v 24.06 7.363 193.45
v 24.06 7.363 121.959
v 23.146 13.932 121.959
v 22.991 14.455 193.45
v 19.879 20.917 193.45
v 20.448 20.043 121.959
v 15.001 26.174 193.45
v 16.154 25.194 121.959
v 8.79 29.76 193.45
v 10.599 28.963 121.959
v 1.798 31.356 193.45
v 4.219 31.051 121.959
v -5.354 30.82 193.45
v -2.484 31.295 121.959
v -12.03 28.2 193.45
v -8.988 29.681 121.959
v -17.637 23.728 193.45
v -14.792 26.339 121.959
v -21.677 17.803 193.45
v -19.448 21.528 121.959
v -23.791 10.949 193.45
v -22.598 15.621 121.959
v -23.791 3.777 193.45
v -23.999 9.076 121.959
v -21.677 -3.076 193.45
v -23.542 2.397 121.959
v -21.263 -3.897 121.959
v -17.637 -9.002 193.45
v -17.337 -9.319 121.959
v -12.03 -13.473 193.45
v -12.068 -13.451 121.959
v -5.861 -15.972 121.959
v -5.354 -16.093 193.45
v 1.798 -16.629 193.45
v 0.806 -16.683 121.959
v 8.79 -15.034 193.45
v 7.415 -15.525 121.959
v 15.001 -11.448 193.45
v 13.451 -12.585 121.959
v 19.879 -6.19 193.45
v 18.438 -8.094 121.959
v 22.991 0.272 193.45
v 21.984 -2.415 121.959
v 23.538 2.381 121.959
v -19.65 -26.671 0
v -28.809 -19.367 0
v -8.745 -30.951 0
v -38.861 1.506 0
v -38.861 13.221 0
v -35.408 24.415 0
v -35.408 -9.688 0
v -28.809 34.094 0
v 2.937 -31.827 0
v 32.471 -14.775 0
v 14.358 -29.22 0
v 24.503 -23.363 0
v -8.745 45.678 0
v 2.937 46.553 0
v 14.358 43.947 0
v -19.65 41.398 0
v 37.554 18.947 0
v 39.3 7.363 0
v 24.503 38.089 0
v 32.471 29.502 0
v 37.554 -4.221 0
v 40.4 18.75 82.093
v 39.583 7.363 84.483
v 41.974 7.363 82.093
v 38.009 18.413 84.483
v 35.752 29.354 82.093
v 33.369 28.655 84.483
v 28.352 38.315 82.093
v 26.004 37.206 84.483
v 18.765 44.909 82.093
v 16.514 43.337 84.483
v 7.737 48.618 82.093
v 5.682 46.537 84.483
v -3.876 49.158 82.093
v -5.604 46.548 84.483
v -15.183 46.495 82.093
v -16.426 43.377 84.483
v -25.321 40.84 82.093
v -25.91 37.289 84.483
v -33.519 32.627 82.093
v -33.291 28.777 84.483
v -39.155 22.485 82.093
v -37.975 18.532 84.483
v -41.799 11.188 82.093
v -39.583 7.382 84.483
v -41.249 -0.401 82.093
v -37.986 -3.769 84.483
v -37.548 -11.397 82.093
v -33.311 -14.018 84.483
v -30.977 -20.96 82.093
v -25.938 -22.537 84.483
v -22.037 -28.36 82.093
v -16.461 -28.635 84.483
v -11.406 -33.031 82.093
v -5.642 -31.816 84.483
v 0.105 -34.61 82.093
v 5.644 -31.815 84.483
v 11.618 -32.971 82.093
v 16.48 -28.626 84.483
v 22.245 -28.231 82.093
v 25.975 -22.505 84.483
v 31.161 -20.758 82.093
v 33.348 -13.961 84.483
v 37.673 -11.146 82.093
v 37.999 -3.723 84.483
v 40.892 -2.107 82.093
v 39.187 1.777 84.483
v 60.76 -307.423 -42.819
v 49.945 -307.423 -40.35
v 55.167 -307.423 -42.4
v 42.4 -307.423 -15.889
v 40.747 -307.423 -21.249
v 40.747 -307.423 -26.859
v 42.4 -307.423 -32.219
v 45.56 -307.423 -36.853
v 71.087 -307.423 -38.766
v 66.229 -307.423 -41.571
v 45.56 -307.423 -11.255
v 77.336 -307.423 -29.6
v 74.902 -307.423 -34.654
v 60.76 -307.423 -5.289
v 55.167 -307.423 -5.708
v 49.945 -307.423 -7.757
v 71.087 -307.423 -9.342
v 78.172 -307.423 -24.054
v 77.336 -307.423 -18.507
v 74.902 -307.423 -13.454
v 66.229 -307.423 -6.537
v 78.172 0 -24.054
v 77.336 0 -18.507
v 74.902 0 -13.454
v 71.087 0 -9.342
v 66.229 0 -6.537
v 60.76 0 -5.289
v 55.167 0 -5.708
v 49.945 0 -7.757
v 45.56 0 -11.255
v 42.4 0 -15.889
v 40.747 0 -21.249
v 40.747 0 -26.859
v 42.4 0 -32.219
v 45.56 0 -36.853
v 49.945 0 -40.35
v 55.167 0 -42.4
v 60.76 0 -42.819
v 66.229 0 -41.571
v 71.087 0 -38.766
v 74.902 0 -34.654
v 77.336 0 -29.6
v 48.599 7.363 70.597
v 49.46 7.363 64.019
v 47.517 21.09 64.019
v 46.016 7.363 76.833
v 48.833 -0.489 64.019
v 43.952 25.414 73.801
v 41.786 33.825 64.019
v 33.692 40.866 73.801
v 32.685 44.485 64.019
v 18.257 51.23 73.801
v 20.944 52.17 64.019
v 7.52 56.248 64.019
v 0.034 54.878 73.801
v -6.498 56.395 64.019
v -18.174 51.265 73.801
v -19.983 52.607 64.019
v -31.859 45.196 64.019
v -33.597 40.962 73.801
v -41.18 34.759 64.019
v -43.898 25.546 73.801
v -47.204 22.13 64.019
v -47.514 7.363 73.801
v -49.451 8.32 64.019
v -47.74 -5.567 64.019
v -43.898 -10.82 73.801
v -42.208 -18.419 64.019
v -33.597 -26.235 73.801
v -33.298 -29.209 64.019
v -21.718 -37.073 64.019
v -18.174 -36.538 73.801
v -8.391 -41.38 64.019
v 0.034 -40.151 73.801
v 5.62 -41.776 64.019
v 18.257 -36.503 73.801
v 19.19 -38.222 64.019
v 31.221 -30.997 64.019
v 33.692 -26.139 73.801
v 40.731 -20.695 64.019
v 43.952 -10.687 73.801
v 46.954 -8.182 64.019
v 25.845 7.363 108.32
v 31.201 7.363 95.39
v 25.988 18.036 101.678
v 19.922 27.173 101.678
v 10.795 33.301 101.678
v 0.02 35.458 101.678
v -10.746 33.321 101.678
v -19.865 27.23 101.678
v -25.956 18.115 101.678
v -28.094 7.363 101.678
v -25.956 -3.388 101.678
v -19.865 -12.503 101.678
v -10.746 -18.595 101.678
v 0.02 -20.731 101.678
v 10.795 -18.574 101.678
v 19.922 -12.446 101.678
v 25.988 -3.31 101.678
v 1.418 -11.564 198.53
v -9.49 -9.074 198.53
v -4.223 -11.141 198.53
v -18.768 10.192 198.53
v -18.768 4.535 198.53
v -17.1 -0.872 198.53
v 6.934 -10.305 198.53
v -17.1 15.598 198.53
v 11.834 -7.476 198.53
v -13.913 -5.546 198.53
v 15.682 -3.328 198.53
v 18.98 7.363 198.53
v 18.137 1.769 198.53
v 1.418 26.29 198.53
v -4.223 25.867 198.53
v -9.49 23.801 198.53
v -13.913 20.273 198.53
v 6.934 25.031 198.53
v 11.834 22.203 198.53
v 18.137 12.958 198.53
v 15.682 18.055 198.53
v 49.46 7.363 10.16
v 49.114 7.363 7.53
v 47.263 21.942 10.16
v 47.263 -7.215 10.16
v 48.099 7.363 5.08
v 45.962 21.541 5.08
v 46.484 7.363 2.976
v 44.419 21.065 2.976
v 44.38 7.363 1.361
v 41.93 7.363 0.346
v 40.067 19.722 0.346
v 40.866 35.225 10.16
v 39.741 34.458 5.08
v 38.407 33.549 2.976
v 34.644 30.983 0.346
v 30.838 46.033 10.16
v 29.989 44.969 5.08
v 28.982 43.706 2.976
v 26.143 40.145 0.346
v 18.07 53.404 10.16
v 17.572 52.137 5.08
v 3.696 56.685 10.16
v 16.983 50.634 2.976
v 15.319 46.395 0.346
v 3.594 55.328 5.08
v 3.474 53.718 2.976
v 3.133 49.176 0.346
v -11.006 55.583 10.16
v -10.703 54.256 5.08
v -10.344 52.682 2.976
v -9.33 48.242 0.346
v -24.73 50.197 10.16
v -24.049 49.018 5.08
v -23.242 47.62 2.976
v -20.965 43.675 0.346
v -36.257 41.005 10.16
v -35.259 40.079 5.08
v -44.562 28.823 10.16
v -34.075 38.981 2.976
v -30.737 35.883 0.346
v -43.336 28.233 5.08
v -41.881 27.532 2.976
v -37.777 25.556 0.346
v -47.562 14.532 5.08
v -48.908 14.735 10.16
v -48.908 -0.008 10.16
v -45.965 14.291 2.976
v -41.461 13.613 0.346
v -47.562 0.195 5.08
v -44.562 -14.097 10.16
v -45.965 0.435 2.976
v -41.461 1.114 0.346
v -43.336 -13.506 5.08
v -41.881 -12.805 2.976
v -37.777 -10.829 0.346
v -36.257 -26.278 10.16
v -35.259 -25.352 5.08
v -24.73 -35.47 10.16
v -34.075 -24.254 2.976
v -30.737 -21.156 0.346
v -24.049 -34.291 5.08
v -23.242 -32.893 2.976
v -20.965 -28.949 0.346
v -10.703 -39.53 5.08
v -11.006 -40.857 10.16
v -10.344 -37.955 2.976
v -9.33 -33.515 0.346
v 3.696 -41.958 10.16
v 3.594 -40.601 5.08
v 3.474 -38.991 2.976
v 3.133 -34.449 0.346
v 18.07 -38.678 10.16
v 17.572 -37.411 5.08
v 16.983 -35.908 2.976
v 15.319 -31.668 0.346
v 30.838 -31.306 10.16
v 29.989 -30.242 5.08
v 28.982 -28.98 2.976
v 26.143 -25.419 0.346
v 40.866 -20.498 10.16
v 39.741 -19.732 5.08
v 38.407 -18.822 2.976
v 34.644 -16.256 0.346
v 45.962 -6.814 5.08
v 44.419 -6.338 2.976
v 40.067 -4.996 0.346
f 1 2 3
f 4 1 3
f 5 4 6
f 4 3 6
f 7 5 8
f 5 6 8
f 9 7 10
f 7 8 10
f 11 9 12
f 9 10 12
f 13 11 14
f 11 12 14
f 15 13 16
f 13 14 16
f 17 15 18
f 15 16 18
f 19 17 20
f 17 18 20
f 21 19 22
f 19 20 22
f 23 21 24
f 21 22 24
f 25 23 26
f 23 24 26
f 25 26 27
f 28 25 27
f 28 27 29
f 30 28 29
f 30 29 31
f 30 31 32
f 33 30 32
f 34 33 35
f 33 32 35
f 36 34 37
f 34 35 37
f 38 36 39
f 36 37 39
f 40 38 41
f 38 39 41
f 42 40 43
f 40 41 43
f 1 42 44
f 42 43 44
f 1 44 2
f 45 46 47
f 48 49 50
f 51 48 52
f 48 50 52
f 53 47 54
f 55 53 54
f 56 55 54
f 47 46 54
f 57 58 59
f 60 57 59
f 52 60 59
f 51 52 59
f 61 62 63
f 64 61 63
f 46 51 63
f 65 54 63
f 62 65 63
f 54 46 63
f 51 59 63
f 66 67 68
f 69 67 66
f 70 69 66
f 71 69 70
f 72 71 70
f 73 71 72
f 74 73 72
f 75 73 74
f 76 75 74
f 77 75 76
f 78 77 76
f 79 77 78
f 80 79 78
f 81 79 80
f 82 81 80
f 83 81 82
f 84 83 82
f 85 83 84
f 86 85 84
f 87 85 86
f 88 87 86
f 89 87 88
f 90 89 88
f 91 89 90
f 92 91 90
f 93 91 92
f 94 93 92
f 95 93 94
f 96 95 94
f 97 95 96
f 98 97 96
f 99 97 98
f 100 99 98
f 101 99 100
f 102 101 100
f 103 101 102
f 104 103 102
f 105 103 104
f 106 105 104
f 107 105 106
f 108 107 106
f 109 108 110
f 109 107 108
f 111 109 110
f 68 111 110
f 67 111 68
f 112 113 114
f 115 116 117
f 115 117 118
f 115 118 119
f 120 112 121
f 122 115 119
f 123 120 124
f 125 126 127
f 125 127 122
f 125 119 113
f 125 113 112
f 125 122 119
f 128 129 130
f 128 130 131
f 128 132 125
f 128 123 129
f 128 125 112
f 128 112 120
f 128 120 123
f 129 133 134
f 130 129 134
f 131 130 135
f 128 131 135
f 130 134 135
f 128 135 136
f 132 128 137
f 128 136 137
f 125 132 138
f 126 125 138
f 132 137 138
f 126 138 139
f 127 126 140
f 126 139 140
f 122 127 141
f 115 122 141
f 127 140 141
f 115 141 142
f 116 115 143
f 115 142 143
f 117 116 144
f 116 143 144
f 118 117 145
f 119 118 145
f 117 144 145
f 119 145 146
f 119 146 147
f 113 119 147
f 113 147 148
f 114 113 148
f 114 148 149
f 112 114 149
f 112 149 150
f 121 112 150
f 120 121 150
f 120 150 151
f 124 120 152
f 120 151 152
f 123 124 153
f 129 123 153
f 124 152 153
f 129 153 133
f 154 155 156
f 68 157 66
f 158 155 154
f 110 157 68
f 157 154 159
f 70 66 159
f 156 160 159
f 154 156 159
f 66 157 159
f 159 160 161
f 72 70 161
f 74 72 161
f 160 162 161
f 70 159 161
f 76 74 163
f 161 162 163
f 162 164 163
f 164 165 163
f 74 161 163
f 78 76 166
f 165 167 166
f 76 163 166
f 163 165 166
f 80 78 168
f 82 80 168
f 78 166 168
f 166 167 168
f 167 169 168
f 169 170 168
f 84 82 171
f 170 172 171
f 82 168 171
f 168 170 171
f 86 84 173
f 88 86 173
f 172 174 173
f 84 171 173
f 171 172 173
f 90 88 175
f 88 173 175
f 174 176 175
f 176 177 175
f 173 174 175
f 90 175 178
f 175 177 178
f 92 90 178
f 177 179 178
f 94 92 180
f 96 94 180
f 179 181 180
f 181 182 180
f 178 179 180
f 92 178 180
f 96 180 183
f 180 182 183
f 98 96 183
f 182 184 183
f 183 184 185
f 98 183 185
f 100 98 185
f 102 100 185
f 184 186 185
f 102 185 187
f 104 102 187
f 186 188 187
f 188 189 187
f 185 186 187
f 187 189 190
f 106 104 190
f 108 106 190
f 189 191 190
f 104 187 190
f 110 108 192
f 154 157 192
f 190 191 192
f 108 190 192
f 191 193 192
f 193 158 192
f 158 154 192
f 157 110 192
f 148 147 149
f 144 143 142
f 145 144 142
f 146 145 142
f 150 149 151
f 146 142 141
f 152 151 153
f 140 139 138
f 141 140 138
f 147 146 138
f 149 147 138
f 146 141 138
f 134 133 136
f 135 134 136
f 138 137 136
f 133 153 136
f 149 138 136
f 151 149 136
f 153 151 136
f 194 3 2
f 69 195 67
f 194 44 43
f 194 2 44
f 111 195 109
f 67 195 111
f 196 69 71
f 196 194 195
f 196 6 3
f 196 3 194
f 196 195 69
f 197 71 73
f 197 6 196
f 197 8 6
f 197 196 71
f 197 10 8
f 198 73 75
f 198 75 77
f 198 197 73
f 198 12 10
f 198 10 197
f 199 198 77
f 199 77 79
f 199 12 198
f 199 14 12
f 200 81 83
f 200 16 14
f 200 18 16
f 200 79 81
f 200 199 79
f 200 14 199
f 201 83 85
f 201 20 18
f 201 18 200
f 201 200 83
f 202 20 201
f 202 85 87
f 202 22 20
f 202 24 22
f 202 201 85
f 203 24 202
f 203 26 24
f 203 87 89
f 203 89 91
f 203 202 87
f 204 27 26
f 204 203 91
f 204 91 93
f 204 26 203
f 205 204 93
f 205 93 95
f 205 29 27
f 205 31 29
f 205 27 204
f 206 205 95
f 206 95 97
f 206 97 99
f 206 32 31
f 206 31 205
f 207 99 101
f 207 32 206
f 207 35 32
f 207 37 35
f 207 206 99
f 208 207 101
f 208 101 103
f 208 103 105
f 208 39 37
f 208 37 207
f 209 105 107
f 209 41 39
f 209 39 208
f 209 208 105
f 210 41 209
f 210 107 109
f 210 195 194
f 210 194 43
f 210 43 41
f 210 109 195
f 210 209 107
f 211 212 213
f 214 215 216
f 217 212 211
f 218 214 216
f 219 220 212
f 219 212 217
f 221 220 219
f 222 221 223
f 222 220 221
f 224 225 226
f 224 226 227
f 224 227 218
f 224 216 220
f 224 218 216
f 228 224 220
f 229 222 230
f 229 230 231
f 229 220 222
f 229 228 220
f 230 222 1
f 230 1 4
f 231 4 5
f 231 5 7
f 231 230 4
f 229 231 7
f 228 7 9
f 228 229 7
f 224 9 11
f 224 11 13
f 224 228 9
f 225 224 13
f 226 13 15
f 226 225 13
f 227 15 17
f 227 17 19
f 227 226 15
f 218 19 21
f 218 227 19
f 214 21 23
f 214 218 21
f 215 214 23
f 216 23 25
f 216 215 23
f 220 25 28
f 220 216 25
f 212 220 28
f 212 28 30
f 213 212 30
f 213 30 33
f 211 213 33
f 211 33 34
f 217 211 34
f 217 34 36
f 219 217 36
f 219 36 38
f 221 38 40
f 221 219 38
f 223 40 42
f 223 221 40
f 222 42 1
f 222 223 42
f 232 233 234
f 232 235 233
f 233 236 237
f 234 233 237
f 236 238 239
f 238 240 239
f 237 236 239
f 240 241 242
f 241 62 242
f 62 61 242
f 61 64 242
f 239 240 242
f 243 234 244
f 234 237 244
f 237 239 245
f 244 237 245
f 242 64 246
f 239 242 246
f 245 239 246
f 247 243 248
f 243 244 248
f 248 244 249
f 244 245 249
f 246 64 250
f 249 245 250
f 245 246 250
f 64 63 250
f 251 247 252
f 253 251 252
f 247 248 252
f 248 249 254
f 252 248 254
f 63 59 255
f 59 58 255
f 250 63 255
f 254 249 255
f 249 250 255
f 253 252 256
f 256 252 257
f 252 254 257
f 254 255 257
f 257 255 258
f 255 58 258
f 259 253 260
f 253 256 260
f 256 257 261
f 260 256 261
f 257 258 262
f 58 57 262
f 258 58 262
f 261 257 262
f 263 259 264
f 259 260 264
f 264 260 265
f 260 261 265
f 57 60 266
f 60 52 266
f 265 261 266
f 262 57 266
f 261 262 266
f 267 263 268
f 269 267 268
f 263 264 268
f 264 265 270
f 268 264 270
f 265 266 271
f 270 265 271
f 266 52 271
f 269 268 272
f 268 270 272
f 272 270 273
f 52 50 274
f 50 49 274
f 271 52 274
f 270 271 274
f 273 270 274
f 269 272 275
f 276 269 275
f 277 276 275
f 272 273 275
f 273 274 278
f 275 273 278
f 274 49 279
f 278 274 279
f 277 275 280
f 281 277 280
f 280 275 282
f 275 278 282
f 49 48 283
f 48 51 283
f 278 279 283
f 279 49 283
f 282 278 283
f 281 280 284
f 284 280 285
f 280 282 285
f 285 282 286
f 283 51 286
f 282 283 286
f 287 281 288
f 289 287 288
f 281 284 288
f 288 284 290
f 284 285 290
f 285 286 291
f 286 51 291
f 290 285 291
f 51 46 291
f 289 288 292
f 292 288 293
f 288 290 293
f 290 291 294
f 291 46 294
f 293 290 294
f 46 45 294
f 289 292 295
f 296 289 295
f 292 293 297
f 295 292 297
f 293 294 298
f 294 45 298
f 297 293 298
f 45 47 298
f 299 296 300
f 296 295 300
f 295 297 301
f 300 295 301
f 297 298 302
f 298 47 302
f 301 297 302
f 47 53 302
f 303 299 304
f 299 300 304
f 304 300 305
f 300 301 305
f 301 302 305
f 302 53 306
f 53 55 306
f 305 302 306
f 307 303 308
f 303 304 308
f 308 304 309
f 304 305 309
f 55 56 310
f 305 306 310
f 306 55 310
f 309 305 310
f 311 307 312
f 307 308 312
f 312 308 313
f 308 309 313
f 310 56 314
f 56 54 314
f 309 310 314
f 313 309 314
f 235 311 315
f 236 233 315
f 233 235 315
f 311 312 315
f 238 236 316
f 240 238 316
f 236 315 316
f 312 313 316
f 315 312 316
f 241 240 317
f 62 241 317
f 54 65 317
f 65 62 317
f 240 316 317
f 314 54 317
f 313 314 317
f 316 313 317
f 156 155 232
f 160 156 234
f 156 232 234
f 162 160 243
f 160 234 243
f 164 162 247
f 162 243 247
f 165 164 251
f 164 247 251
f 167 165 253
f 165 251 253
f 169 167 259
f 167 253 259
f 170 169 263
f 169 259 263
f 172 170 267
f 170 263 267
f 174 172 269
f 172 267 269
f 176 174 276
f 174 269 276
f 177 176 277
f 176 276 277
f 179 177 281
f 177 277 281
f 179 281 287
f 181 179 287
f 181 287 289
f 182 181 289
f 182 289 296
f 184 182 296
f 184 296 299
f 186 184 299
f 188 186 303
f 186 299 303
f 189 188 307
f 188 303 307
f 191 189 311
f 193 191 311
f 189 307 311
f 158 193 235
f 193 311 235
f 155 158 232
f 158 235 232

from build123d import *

# Parameters (mm, degrees)
F0_R     = 49.4600164877
F1_DEPTH = 100.0064834952
F2_SIZE  = 25.4
F3_R     = 25.559552511
F4_DEPTH = 98.5232293606
F5_R     = 52.9991248182
F6_SIZE  = 5.08
F7_R     = 10.16
F8_R     = 18.8176208756
F9_DEPTH = 307.4226379395


with BuildPart() as f1:
    # F0 (on Top) → F1 (new body)
    with BuildSketch(Plane.XY):
        with Locations((0, 7.3633268476)):
            Circle(F0_R)
    extrude(amount=F1_DEPTH)

    # F2
    f2_edges = [f1.edges().sort_by_distance(p)[0] for p in [
        (-49.460016, 7.363327, 100.006483),
    ]]
    chamfer(f2_edges, length=F2_SIZE)

    # F3
    f3_edges = [f1.edges().sort_by_distance(p)[0] for p in [
        (-49.460016, 7.363327, 74.606483),
    ]]
    fillet(f3_edges, radius=F3_R)

    # F4 (add): a face of the model
    f4_faces = [f1.faces().sort_by_distance(p)[0] for p in [
        (0, 7.3633268476, 100.0064834952),
    ]]
    extrude(f4_faces, amount=F4_DEPTH)

    # F5
    f5_edges = [f1.edges().sort_by_distance(p)[0] for p in [
        (-24.060016, 7.363327, 100.006483),
    ]]
    fillet(f5_edges, radius=F5_R)

    # F6
    f6_edges = [f1.edges().sort_by_distance(p)[0] for p in [
        (-24.060016, 7.363327, 198.529713),
    ]]
    chamfer(f6_edges, length=F6_SIZE)

    # F7
    f7_edges = [f1.edges().sort_by_distance(p)[0] for p in [
        (-49.460016, 7.363327, 0),
    ]]
    fillet(f7_edges, radius=F7_R)


with BuildPart() as f9:
    # F8 (on Front) → F9 (new body)
    with BuildSketch(Plane.XZ):
        with Locations((59.3541711569, -24.0539014339)):
            Circle(F8_R)
    extrude(amount=F9_DEPTH)


solid = Compound([f1.part, f9.part])
